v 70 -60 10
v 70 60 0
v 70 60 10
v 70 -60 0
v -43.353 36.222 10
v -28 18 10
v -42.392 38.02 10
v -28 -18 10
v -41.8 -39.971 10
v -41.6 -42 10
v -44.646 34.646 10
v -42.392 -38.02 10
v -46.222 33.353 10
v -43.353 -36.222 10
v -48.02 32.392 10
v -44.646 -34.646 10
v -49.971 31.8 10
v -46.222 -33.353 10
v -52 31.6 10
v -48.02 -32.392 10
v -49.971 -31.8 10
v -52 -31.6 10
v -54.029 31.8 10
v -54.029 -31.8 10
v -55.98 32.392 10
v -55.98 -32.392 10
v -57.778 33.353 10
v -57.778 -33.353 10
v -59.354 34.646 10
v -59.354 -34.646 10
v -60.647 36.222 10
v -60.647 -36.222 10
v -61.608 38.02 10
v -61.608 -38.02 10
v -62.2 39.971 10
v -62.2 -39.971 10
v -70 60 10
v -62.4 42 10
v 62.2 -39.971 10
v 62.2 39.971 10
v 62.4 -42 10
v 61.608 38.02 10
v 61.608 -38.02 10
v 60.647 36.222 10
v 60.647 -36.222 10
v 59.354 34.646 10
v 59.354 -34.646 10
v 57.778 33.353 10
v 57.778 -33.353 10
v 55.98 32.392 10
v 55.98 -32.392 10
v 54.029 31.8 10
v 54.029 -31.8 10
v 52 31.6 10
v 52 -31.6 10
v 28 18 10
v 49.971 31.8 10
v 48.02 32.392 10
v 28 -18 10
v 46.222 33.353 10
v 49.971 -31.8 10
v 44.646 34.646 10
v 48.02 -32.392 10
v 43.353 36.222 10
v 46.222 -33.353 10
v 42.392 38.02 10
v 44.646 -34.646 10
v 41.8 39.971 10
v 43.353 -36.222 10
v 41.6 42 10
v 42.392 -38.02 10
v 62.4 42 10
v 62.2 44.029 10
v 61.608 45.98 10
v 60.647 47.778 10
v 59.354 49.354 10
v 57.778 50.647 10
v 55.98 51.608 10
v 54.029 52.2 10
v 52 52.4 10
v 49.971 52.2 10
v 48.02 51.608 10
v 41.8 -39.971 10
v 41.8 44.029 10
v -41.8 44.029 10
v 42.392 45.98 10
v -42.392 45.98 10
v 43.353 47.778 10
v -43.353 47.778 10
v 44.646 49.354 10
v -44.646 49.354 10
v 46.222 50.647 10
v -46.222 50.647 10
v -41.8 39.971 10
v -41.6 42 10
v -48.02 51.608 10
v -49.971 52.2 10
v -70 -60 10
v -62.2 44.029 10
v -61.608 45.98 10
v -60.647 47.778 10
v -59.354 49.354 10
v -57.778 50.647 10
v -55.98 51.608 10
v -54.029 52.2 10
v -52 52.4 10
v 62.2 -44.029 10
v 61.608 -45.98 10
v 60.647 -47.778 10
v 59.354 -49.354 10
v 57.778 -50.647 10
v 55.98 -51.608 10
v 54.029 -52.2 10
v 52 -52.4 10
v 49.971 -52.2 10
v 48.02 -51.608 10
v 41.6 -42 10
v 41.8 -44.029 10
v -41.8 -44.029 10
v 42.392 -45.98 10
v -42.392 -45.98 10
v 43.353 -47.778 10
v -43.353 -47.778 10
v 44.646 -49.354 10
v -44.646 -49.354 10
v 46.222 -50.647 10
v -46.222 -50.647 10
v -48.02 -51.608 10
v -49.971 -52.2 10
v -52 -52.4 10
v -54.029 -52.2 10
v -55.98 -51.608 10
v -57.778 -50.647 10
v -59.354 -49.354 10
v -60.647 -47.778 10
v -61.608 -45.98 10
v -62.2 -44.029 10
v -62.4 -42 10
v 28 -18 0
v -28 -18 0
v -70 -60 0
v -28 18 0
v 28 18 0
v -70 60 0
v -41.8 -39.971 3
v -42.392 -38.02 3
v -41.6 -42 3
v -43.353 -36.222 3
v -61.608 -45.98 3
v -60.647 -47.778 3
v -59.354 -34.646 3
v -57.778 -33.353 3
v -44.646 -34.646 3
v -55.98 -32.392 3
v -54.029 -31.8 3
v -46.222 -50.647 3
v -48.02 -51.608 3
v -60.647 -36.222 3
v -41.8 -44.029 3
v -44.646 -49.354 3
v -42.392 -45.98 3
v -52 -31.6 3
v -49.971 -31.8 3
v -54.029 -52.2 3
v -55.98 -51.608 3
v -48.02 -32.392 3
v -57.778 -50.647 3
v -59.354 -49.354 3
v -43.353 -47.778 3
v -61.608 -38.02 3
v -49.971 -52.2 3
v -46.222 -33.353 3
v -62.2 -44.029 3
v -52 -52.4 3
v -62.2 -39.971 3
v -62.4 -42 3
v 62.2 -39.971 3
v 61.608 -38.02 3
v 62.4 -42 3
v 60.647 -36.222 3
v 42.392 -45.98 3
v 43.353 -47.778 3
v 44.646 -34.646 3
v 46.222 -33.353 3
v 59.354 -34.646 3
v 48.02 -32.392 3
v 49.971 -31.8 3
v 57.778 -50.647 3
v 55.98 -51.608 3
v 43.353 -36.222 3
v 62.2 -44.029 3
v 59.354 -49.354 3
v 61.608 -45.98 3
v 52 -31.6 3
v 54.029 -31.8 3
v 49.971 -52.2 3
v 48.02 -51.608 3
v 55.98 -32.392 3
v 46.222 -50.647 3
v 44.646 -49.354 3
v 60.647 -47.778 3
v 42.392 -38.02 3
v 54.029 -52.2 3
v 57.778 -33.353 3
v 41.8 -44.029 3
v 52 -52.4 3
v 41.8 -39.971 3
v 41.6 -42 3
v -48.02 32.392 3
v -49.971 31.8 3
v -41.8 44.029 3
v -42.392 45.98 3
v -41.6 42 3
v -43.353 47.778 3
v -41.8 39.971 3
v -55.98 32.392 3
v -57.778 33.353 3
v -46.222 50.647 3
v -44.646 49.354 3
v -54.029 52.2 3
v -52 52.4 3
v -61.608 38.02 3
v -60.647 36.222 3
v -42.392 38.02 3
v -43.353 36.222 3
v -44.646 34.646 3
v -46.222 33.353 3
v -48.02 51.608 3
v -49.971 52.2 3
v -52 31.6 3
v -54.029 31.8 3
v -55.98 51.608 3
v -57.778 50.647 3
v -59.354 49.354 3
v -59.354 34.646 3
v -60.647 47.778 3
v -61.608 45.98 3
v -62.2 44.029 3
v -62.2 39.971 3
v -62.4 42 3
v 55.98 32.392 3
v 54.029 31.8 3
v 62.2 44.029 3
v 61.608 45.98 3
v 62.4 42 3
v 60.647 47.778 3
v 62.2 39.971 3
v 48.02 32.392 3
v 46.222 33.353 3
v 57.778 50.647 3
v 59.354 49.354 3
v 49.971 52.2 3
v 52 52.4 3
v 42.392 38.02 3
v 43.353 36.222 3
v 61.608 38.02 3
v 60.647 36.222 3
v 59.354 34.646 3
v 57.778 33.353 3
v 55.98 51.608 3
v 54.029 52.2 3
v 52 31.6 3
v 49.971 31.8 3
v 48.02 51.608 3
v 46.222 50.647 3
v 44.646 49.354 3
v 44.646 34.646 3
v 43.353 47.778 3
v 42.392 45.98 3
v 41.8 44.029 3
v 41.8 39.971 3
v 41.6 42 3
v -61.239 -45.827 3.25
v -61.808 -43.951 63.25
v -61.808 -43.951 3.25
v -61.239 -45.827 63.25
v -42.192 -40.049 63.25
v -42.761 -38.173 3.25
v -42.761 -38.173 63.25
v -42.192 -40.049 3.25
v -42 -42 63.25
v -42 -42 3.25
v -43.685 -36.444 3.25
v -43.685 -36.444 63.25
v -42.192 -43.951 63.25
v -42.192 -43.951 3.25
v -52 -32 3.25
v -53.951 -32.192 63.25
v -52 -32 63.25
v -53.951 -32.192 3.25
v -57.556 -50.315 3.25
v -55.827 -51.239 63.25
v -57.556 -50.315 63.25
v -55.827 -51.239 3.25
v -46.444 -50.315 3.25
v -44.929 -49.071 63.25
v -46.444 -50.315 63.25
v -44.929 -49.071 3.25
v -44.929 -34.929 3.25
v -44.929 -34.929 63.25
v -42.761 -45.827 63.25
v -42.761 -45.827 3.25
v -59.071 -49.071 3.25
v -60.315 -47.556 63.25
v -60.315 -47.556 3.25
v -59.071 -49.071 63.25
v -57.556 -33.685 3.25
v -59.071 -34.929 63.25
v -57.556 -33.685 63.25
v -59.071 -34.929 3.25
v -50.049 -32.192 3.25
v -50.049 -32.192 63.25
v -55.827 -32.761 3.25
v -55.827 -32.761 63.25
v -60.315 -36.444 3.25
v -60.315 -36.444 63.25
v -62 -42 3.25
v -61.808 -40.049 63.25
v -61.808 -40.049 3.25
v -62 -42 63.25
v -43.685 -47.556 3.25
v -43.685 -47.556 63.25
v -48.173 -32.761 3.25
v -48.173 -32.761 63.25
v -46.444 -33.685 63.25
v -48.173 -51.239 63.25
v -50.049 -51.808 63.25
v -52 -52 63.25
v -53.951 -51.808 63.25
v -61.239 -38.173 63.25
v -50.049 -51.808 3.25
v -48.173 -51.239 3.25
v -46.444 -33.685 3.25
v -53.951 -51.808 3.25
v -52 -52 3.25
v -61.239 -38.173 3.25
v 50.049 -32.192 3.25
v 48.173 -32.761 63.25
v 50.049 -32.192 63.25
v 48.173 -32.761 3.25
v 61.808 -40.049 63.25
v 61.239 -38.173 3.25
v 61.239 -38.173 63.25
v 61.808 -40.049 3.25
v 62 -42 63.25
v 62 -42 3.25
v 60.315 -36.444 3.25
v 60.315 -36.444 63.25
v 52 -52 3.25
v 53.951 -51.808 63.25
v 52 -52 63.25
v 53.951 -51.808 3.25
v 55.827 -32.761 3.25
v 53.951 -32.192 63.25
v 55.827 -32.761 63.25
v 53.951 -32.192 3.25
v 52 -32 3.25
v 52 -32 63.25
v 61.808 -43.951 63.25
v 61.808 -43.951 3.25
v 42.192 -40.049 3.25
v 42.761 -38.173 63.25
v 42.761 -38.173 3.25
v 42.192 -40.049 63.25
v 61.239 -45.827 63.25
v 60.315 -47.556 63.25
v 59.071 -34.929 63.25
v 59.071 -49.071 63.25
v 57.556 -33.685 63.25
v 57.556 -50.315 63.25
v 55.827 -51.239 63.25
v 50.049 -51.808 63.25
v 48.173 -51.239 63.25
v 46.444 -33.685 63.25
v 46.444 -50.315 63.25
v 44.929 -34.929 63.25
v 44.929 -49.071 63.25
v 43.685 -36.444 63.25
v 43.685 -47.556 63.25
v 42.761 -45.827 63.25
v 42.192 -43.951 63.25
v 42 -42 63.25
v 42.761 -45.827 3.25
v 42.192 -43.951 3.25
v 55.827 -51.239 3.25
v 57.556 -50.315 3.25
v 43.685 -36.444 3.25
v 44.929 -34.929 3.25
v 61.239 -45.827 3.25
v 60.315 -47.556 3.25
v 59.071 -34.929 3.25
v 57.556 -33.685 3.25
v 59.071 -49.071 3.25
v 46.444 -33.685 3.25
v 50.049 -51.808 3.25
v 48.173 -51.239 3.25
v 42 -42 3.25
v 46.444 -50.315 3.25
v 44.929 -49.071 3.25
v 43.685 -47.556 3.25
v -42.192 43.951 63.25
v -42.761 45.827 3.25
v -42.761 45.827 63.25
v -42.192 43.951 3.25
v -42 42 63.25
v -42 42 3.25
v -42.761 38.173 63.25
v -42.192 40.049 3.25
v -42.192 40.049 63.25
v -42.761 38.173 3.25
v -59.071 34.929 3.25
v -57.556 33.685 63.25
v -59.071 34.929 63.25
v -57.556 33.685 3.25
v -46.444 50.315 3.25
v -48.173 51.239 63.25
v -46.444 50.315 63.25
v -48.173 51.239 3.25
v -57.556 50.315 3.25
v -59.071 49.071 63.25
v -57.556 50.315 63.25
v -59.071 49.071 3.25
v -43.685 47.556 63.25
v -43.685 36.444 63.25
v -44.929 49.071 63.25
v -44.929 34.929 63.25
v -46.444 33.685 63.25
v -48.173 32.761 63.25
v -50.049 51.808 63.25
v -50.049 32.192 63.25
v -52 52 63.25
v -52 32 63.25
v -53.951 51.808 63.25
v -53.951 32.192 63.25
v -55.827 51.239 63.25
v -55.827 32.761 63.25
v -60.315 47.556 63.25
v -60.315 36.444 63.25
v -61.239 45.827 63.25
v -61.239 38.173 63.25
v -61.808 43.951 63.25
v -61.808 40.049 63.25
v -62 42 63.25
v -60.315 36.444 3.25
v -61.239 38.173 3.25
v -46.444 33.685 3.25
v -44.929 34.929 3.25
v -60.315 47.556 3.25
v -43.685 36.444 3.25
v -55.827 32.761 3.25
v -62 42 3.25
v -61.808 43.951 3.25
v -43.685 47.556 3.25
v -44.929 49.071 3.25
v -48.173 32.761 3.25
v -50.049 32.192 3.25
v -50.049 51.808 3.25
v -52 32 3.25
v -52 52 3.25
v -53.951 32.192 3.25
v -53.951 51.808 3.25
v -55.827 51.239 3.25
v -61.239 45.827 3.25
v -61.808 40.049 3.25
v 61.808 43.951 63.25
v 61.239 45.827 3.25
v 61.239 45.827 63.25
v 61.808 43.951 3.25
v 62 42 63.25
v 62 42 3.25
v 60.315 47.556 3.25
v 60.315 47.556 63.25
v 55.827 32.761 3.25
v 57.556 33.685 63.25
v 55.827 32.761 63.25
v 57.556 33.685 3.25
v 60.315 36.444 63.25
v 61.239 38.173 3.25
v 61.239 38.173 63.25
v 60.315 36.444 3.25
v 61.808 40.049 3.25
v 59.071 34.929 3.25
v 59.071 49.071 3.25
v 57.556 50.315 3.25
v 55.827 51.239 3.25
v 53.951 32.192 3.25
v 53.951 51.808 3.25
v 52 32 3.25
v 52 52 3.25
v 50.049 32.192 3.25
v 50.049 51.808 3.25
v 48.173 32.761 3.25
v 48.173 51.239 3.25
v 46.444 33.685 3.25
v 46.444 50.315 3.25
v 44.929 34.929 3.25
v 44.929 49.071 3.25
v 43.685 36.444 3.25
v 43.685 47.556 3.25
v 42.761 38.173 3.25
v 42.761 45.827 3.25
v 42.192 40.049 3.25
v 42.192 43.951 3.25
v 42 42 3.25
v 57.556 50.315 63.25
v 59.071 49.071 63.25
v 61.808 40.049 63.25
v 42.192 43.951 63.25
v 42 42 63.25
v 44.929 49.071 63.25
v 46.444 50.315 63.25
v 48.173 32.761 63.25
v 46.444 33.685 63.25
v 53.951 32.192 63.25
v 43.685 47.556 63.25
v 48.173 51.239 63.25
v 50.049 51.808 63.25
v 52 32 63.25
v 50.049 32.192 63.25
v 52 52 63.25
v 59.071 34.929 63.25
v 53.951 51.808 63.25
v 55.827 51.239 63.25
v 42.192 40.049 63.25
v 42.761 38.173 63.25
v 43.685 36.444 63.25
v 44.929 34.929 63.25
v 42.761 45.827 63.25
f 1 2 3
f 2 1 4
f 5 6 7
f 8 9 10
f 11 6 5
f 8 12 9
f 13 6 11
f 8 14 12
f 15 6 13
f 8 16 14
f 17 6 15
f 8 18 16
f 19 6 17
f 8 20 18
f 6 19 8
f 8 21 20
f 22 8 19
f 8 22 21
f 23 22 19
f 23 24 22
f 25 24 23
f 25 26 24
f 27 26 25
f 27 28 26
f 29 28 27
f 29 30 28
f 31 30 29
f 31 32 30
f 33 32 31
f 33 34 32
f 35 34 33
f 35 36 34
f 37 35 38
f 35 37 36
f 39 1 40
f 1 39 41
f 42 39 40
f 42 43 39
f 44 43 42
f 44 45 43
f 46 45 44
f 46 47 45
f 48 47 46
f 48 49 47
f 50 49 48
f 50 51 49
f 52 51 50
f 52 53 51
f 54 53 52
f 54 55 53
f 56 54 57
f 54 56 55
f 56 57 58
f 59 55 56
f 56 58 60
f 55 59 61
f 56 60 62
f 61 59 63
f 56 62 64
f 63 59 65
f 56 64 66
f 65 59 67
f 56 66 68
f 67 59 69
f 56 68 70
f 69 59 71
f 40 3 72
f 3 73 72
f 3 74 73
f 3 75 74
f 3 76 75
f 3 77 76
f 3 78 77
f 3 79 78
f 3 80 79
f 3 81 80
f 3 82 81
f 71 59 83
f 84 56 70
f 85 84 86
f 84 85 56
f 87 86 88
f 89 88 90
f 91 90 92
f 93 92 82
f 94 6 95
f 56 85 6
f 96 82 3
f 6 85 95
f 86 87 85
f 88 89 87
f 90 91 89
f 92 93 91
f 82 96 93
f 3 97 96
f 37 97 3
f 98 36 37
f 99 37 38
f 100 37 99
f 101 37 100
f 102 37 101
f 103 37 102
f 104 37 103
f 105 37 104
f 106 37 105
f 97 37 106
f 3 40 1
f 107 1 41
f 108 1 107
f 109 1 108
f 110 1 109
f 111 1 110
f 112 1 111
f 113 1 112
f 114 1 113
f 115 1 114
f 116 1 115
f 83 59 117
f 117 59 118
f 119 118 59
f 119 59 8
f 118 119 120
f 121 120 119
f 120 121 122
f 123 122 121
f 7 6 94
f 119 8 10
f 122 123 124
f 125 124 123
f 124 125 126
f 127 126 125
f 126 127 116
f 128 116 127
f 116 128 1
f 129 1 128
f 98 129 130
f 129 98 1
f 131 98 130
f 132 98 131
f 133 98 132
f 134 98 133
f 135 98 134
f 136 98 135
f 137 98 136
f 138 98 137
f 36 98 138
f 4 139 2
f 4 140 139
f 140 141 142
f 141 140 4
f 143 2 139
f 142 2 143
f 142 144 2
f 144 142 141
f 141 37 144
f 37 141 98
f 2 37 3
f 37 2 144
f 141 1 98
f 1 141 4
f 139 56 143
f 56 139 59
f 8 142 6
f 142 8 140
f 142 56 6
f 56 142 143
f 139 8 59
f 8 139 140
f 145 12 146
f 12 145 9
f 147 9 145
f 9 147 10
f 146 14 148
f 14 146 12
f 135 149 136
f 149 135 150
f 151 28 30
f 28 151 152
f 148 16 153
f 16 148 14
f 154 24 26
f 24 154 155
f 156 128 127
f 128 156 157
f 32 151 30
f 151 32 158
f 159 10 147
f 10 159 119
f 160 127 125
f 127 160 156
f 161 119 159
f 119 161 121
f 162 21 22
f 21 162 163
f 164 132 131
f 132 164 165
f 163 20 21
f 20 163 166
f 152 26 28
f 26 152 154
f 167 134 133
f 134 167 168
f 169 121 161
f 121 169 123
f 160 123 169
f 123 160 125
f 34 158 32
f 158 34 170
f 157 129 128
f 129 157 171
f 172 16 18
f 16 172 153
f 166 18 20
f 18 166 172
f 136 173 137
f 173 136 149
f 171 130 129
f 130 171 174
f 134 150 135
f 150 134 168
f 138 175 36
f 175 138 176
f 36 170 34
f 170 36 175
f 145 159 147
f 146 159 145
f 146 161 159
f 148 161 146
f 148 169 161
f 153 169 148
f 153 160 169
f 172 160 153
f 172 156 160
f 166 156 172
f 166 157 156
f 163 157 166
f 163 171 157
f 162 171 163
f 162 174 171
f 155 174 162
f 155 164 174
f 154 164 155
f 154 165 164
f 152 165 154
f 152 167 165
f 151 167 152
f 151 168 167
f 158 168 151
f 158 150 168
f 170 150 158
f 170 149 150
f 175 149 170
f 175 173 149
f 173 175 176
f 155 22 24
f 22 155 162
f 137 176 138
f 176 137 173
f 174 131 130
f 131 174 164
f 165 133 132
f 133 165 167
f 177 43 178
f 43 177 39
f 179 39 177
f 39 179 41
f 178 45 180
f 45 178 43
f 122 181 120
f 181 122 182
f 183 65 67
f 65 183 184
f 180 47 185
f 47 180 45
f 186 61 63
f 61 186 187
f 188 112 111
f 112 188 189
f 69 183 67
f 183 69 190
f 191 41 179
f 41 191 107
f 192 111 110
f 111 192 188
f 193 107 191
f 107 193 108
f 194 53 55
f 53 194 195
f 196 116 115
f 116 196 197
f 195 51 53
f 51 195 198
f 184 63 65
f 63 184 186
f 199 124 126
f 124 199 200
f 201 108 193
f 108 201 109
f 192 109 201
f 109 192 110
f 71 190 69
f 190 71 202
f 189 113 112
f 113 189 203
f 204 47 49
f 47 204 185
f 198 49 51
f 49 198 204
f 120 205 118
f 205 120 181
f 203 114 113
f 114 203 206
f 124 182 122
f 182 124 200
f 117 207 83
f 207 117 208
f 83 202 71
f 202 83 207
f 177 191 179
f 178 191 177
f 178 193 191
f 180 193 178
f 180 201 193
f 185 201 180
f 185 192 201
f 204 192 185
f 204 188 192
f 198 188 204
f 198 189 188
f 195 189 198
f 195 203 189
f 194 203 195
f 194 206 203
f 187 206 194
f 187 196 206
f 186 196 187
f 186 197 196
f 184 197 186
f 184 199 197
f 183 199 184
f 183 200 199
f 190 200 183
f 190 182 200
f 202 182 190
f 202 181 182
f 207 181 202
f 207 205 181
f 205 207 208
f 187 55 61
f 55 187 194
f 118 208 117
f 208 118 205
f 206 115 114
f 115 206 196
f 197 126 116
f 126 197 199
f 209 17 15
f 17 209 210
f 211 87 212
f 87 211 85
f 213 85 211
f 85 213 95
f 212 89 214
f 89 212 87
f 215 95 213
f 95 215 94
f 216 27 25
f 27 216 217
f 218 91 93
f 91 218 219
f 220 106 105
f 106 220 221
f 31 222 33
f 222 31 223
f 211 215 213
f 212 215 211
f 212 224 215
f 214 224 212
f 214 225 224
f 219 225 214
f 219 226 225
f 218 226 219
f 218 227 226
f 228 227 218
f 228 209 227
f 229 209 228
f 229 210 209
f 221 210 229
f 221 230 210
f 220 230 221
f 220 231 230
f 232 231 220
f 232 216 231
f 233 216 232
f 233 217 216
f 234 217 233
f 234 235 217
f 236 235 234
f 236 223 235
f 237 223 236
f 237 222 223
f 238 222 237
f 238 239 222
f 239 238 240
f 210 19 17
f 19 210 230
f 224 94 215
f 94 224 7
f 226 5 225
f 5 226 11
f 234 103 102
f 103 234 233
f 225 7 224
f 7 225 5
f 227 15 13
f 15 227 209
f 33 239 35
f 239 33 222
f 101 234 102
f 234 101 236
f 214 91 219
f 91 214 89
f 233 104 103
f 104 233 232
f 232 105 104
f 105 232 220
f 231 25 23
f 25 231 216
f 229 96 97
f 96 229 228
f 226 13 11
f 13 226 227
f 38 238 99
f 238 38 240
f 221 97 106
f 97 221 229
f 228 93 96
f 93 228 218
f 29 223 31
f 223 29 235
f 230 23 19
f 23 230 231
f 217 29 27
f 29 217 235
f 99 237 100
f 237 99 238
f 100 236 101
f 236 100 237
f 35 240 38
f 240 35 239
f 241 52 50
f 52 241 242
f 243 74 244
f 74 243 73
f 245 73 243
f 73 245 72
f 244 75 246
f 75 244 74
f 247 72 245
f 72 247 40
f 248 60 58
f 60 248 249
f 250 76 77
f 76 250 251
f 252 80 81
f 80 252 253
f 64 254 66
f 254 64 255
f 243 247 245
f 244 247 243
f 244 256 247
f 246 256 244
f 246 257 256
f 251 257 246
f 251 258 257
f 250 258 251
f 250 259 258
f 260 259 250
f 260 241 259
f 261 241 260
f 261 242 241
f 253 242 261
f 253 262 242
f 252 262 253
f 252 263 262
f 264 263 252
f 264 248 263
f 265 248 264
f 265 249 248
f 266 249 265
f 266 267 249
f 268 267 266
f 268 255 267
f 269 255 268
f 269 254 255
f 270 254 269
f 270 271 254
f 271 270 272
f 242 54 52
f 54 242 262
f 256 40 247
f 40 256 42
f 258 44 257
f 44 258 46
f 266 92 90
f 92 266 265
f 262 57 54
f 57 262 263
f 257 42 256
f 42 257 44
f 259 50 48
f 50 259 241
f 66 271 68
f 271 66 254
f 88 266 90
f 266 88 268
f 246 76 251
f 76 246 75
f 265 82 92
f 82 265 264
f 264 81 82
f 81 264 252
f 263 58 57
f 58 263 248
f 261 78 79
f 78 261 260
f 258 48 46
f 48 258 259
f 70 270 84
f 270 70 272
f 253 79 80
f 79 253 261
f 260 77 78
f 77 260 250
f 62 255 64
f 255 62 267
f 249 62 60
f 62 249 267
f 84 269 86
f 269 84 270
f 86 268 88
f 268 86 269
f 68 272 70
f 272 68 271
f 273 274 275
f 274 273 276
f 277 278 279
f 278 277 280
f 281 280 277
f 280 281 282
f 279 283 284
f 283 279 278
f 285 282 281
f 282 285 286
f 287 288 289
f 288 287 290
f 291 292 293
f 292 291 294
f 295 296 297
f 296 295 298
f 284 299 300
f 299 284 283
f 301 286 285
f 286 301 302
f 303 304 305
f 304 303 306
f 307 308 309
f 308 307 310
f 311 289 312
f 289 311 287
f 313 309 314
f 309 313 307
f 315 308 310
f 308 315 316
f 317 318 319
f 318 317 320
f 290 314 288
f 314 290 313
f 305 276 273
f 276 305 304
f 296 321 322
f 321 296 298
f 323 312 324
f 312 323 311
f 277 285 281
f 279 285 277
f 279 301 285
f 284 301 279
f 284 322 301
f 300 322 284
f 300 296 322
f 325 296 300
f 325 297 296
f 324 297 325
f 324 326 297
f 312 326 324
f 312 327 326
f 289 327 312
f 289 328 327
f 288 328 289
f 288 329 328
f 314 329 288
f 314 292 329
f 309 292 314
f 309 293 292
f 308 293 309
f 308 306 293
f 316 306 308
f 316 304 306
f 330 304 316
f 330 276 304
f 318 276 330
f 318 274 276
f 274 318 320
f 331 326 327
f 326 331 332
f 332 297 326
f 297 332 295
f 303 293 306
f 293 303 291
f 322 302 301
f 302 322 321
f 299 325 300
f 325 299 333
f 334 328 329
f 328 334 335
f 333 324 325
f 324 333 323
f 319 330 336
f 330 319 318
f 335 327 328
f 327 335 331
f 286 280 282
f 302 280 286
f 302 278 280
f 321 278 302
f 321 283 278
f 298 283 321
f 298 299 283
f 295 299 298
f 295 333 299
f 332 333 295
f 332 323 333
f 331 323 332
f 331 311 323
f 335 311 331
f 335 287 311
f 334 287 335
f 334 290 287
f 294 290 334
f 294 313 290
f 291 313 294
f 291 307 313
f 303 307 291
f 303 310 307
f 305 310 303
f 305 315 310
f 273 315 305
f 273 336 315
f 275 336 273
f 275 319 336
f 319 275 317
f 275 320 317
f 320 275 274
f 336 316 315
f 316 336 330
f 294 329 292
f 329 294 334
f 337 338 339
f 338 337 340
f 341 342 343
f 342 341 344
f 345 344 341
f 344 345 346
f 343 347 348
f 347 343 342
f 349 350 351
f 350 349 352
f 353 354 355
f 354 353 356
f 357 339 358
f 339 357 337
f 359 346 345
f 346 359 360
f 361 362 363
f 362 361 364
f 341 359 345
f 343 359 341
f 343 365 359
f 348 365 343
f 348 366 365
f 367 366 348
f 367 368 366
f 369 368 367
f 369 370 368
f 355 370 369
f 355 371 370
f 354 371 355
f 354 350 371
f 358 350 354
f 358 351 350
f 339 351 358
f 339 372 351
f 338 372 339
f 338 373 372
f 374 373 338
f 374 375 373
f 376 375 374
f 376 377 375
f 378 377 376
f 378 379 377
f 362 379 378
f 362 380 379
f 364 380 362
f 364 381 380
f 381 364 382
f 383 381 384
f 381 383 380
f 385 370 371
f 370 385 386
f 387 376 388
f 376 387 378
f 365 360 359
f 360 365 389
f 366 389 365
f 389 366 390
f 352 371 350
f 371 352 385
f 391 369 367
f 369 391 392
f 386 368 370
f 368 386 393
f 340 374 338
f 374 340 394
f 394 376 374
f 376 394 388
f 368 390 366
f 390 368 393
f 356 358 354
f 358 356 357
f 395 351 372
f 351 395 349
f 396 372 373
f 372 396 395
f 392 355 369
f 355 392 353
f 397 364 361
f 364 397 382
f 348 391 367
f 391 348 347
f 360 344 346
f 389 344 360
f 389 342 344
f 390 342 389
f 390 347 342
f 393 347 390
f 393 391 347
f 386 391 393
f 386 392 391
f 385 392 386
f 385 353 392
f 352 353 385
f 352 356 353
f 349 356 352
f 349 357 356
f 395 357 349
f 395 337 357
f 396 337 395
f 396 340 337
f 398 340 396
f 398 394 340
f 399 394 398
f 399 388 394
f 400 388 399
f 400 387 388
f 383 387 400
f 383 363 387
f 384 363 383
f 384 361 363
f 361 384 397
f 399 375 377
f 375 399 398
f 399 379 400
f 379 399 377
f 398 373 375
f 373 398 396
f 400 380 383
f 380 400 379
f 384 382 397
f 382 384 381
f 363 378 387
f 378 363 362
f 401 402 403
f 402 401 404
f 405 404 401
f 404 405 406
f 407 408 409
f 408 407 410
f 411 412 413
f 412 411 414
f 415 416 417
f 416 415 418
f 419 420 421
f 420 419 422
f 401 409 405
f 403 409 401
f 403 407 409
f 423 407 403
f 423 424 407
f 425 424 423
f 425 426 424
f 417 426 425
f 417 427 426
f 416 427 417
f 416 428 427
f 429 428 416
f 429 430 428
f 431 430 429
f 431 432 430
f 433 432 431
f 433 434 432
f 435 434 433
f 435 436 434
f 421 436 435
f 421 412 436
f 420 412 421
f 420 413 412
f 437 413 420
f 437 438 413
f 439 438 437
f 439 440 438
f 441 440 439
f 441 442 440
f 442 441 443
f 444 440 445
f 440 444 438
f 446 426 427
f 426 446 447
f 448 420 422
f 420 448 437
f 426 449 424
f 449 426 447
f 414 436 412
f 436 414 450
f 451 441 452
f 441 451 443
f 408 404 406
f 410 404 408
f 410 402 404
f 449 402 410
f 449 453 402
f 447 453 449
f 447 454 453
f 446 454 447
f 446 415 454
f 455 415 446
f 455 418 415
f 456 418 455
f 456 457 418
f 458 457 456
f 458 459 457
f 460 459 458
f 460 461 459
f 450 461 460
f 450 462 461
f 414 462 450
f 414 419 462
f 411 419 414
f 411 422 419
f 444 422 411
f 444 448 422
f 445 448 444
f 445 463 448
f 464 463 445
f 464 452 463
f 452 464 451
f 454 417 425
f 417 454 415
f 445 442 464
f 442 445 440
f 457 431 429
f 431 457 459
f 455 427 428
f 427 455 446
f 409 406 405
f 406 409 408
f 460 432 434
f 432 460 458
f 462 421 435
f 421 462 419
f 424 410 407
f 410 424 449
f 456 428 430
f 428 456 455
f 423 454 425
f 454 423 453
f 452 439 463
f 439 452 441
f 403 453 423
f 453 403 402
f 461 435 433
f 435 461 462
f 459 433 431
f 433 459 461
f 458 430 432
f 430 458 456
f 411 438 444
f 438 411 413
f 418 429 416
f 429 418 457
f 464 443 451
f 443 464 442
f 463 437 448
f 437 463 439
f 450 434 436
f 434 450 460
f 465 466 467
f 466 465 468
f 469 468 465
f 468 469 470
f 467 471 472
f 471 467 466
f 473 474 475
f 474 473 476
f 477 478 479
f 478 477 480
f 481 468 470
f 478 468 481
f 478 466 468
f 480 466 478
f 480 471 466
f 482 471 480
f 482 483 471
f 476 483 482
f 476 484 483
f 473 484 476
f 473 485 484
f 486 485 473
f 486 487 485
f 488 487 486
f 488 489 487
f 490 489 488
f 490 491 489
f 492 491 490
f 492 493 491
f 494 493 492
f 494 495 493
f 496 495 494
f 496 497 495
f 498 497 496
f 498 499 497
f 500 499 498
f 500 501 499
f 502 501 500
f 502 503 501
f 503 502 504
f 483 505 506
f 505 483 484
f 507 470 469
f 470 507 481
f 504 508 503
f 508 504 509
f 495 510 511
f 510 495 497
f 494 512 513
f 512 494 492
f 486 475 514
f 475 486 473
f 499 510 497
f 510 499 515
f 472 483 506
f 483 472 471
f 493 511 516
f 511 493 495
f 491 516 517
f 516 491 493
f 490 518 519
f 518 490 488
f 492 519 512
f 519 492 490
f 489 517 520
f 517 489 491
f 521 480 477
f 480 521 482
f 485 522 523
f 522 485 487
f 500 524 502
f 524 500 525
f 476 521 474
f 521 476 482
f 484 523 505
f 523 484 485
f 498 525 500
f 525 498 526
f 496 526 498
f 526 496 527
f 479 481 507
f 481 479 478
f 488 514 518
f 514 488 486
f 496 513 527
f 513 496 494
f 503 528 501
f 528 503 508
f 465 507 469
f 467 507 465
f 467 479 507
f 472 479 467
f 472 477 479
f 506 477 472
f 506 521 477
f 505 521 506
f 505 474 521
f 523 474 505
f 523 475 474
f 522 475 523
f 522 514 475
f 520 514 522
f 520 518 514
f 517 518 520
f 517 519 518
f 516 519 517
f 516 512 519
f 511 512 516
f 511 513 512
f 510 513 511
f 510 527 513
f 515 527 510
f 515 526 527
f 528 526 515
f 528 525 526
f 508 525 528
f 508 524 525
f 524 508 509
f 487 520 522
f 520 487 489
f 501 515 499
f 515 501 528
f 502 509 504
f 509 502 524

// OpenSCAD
$fn = 32;

// ------------------------------------------------------------------------
// Frame with four posts: 140 x 120 mm frame, four d20 posts
// Every part is its own module, assembly() places them once.
// ------------------------------------------------------------------------

// --- part 1 ---
module base_frame() {
  difference() {
    translate([-70, -60, 0]) cube([140, 120, 10]);
    translate([-28, -18, -1]) cube([56, 36, 12]);
    translate([-52, -42, 3]) cylinder(h = 8, d = 20.8);
    translate([52, -42, 3]) cylinder(h = 8, d = 20.8);
    translate([-52, 42, 3]) cylinder(h = 8, d = 20.8);
    translate([52, 42, 3]) cylinder(h = 8, d = 20.8);
  }
}

// --- part 2 ---
module post1() {
  cylinder(h = 60, d = 20);
}

// --- part 3 ---
module post2() {
  cylinder(h = 60, d = 20);
}

// --- part 4 ---
module post3() {
  cylinder(h = 60, d = 20);
}

// --- part 5 ---
module post4() {
  cylinder(h = 60, d = 20);
}

// --- assembly ---
module assembly() {
  translate([0, 0, 0]) rotate([0, 0, 0]) base_frame();
  translate([-52, -42, 3.25]) rotate([0, 0, 0]) post1();
  translate([52, -42, 3.25]) rotate([0, 0, 0]) post2();
  translate([-52, 42, 3.25]) rotate([0, 0, 0]) post3();
  translate([52, 42, 3.25]) rotate([0, 0, 0]) post4();
}

assembly();
